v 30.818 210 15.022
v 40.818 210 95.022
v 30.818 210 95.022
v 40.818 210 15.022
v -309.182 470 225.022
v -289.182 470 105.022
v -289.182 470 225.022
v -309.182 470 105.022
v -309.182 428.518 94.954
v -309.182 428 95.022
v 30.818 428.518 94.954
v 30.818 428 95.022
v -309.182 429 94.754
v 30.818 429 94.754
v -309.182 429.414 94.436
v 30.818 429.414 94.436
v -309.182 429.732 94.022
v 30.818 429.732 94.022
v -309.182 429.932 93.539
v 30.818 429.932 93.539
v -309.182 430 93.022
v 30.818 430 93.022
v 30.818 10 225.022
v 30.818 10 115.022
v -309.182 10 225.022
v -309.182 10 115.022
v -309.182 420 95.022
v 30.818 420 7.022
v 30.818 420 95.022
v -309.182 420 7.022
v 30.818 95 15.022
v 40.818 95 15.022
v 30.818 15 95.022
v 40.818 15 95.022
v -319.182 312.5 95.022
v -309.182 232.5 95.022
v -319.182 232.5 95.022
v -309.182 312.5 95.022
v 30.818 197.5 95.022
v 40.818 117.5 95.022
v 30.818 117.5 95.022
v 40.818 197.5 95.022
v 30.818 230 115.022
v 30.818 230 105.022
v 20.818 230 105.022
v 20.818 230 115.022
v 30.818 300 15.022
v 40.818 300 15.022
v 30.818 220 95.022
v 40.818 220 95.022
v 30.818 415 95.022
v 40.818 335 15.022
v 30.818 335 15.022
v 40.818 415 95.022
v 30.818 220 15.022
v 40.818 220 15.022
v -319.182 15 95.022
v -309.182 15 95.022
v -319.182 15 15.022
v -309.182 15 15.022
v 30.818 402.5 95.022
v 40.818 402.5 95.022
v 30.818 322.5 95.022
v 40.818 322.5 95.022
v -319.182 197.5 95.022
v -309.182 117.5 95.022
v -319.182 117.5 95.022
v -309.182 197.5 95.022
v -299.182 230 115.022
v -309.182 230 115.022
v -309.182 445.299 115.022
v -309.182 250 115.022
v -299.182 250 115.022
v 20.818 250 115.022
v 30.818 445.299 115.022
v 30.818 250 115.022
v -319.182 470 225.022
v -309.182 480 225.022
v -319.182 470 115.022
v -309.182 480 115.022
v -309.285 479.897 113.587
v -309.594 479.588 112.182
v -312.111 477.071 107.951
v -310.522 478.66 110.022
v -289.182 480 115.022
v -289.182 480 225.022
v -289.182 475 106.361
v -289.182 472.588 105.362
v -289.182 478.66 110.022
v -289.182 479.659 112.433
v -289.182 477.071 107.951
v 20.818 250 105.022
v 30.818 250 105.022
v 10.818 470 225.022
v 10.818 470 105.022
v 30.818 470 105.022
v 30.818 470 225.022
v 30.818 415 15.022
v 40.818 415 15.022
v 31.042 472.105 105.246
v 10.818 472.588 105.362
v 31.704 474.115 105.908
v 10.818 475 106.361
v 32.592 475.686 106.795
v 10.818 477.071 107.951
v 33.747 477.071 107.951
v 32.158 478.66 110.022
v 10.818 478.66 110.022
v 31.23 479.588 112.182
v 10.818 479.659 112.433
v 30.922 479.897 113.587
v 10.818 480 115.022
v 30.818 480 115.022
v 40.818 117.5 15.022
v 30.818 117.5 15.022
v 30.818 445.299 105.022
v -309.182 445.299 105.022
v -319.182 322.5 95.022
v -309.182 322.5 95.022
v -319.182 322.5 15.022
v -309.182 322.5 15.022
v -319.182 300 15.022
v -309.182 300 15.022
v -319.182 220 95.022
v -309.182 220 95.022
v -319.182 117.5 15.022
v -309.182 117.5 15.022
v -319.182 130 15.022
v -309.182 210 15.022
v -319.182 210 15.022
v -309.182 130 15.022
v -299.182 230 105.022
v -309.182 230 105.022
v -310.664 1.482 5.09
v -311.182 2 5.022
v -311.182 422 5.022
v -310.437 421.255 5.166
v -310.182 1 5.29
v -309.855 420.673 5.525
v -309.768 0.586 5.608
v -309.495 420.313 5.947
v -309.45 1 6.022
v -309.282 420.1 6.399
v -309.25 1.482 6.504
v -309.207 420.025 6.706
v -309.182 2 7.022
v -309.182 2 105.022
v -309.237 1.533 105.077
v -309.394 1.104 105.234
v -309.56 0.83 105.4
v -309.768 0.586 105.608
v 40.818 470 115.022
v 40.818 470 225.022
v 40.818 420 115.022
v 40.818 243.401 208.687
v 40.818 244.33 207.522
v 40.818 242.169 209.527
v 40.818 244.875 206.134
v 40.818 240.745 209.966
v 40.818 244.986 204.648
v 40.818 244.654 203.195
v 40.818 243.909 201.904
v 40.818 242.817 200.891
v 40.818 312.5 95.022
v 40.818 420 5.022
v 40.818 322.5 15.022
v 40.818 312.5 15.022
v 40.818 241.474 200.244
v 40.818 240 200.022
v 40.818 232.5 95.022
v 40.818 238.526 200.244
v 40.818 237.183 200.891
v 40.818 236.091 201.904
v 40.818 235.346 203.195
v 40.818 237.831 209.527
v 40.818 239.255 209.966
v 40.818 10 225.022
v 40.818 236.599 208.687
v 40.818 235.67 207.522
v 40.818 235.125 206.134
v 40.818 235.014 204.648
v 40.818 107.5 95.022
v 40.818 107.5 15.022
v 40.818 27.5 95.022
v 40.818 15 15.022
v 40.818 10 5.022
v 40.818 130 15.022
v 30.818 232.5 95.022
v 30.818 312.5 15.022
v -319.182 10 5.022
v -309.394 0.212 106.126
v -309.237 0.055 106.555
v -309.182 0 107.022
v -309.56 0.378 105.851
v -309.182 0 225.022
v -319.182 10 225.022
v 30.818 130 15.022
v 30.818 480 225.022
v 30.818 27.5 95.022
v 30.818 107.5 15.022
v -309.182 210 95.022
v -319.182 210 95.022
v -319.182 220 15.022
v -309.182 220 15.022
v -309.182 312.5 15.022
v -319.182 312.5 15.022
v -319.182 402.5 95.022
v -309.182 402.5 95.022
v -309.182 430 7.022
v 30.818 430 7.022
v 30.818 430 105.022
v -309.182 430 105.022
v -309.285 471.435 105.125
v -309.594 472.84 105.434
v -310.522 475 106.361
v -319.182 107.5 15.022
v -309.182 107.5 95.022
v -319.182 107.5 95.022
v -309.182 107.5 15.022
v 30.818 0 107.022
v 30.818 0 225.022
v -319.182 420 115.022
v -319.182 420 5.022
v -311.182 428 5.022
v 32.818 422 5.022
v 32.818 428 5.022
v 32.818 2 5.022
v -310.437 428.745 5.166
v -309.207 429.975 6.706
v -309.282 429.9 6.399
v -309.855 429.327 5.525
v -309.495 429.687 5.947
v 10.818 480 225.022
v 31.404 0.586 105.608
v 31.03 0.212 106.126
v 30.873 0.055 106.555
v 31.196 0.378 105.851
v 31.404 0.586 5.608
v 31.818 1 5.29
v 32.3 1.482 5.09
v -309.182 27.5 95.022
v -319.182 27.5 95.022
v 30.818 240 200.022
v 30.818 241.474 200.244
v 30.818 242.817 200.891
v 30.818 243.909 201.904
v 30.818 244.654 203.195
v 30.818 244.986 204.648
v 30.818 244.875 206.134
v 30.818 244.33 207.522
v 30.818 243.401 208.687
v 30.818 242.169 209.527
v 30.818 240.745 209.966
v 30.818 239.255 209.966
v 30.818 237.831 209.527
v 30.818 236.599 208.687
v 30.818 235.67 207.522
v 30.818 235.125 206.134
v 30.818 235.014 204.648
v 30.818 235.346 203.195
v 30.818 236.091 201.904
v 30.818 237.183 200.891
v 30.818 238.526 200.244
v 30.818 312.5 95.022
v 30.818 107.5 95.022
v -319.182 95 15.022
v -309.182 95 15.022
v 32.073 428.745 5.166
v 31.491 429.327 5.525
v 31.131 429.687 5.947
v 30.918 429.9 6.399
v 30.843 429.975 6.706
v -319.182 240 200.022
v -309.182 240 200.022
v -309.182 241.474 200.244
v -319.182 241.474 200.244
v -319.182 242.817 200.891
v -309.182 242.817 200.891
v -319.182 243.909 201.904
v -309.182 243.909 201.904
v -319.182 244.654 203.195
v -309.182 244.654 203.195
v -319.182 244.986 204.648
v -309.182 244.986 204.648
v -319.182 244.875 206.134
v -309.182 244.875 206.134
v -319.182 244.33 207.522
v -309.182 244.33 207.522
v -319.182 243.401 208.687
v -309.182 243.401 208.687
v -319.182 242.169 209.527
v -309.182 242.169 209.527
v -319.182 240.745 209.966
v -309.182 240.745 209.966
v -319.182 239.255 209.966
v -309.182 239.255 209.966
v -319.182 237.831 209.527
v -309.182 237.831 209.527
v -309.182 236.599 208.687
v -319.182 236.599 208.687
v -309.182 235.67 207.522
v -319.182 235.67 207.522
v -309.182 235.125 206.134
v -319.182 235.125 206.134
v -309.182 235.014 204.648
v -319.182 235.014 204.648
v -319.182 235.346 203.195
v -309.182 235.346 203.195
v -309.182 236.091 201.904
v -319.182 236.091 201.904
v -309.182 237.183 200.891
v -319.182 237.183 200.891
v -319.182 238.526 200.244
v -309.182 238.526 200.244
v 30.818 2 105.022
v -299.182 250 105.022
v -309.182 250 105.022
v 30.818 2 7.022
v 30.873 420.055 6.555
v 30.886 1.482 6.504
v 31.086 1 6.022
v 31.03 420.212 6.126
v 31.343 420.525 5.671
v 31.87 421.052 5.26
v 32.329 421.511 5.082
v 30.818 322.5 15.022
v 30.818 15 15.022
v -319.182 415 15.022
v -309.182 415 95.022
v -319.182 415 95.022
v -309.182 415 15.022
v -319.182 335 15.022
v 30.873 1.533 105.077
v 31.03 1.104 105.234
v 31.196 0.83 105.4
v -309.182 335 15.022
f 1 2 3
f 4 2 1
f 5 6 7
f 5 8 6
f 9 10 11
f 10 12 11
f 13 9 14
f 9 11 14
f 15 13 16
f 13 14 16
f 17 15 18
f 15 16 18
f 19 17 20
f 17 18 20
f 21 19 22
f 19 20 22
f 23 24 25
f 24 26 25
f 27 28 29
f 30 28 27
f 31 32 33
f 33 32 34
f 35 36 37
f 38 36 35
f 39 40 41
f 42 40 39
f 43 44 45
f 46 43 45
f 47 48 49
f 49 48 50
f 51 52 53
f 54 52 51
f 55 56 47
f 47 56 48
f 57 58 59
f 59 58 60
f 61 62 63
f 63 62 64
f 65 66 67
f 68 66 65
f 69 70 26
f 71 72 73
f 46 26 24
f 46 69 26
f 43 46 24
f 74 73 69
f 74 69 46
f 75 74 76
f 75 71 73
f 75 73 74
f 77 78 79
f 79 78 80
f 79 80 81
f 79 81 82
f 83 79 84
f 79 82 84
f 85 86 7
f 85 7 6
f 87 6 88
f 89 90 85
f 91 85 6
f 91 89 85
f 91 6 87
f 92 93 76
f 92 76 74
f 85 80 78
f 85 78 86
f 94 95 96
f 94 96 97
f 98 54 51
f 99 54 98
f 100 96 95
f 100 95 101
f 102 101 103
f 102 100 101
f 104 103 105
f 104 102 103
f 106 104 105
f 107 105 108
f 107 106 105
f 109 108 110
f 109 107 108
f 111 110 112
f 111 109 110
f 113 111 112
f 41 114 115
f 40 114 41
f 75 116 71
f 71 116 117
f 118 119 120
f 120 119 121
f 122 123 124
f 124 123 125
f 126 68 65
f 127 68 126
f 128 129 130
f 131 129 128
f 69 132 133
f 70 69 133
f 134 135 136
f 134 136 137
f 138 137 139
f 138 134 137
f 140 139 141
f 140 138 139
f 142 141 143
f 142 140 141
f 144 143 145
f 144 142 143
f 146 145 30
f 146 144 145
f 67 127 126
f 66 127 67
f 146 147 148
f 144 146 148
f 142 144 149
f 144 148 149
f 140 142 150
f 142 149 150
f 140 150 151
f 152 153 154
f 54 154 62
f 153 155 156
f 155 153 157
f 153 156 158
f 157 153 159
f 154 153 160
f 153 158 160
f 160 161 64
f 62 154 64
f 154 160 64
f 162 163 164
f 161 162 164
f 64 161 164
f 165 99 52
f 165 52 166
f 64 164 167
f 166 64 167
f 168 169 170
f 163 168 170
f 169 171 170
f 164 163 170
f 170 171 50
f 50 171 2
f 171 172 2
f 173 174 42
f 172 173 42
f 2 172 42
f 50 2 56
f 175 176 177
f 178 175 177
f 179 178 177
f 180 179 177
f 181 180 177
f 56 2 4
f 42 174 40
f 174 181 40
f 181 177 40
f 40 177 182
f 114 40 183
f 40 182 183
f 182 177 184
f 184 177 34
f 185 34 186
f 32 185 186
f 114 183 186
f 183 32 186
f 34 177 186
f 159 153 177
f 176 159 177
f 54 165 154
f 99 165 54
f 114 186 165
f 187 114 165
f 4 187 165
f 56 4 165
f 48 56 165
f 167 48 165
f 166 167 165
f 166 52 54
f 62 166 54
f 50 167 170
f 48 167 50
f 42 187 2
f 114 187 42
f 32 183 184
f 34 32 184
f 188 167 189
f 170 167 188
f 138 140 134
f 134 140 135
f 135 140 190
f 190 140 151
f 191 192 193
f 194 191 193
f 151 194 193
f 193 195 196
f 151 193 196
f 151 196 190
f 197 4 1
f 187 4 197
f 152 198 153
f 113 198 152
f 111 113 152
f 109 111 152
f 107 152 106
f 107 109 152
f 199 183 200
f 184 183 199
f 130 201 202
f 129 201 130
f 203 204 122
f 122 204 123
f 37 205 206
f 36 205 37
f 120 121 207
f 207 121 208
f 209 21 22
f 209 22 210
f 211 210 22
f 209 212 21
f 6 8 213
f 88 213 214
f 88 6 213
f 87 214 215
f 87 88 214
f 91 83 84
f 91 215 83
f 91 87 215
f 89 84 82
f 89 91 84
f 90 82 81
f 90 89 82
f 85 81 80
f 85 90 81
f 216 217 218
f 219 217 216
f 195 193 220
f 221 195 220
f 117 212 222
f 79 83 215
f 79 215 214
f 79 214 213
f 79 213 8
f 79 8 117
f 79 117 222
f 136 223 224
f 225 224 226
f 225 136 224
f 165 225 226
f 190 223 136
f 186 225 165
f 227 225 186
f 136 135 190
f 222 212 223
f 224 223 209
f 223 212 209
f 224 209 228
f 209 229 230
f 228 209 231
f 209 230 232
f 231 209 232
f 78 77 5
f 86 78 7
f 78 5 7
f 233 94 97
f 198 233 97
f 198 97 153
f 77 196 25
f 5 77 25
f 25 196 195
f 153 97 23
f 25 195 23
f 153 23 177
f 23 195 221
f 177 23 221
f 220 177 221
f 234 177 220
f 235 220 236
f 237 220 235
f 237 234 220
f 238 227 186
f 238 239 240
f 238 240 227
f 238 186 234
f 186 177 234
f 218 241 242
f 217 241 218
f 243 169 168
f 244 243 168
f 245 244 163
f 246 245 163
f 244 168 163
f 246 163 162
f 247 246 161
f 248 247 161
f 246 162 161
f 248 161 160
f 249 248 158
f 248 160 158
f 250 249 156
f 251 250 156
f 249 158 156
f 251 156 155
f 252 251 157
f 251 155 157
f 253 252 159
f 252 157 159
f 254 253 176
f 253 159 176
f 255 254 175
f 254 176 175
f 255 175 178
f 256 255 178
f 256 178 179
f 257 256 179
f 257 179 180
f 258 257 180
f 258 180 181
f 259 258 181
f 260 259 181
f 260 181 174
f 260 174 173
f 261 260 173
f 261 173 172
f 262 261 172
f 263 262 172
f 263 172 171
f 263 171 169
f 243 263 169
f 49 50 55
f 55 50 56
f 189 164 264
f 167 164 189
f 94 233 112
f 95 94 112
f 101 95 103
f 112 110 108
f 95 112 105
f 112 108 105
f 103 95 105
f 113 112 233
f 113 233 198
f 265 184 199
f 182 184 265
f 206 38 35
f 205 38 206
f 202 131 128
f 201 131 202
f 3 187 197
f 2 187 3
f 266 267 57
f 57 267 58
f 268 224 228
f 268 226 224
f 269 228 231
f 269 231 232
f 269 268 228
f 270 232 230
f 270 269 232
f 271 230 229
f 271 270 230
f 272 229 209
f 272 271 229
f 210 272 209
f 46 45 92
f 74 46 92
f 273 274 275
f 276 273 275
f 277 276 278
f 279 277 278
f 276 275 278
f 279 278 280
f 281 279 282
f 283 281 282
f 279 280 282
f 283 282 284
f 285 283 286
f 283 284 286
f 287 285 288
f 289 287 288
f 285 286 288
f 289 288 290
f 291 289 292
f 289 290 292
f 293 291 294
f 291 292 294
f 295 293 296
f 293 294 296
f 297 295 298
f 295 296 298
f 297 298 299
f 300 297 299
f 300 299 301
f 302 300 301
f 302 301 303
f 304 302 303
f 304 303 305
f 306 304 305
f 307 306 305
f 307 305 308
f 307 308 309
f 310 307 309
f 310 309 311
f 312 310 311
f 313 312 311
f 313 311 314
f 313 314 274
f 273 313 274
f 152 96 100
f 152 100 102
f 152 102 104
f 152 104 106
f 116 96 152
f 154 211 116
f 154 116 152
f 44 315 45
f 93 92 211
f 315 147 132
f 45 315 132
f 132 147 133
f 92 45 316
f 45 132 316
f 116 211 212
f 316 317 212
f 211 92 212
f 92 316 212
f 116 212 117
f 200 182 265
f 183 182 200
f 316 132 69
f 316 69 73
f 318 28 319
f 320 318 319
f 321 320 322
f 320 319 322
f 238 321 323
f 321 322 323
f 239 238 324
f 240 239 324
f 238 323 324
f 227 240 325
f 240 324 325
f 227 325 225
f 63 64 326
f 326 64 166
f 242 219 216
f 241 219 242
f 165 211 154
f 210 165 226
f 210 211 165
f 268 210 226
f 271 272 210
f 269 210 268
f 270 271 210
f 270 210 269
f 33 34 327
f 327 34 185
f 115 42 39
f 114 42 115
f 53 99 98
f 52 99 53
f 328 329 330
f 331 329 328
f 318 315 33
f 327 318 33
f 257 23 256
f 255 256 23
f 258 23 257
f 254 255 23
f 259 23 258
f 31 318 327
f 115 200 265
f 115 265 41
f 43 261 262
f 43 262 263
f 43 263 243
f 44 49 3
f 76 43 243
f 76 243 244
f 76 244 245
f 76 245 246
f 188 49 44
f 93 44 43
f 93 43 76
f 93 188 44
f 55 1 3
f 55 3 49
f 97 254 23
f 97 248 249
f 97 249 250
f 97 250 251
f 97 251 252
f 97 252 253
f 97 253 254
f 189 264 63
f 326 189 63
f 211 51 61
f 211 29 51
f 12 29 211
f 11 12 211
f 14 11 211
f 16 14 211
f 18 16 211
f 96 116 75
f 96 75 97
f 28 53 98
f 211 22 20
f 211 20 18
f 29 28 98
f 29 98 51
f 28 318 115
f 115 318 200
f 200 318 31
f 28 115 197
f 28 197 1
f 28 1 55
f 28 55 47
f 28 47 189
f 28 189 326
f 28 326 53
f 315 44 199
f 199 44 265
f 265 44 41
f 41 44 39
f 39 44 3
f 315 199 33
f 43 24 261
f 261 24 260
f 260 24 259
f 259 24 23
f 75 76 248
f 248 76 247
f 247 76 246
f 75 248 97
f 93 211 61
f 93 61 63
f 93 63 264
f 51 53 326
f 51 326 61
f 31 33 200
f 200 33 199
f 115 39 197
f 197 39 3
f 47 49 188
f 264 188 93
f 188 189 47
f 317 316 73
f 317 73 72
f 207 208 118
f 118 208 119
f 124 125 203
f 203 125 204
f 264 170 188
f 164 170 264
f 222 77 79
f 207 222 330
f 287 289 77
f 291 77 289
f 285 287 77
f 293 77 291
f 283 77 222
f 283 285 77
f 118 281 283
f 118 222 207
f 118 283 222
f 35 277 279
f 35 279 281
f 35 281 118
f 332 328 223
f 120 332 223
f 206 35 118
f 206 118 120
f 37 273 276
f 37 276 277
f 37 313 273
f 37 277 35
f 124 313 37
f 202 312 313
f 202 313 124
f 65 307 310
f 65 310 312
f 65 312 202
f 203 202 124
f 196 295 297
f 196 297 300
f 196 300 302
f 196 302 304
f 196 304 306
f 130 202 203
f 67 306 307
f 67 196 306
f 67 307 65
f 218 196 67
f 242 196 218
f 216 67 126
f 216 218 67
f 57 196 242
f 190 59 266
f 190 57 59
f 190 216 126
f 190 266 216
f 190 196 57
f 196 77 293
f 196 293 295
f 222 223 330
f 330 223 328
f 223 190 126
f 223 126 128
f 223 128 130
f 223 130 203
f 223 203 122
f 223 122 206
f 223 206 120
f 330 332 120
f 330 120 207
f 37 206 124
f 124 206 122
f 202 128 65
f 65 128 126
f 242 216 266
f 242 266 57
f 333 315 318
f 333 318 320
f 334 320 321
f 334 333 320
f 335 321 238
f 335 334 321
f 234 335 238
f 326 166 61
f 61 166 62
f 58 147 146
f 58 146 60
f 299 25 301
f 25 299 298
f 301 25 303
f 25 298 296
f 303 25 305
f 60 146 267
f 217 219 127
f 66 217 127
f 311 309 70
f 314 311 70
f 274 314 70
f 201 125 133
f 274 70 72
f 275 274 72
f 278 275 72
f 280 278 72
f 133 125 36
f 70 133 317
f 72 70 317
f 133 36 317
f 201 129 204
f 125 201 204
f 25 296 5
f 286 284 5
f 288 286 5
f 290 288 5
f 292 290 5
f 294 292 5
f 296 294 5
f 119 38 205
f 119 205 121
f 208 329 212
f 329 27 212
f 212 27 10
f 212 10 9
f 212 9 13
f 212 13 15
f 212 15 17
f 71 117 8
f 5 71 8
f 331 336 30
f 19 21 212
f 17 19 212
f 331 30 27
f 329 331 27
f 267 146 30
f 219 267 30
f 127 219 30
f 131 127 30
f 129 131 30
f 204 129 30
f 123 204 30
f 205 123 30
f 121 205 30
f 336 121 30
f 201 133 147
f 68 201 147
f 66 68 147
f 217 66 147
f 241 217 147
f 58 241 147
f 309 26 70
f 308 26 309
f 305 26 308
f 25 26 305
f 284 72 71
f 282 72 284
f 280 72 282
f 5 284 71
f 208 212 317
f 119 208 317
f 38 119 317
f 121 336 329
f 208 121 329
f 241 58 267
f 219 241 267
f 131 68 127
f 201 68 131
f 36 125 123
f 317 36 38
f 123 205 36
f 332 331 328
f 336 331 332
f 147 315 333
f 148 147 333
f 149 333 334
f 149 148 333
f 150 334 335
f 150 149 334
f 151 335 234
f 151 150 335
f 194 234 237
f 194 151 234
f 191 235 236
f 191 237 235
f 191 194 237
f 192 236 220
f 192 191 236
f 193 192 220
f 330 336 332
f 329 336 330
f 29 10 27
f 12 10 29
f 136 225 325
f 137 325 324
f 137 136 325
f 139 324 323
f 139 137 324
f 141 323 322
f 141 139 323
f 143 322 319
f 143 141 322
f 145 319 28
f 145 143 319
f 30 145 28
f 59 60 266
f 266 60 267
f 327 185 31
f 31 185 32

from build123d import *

# Parameters (mm, degrees)
SKETCH2_W                = 360
SKETCH2_H                = 220
BOSS_EXTRUDE1_DEPTH      = 480
SKETCH4_W                = 280
SKETCH4_H                = 110
CUT_EXTRUDE2_DEPTH       = 470
SKETCH5_W                = 110
SKETCH5_H                = 460
CUT_EXTRUDE3_DEPTH       = 40
SKETCH6_W                = 340
SKETCH6_H                = 100
CUT_EXTRUDE4_DEPTH       = 50
SKETCH7_W                = 340
SKETCH7_H                = 10
CUT_EXTRUDE5_DEPTH       = 420
SKETCH8_W                = 340
SKETCH8_H                = 410
CUT_EXTRUDE6_DEPTH       = 90
SKETCH12_W               = 10
SKETCH12_H               = 20
CUT_EXTRUDE9_DEPTH       = 10
CUT_EXTRUDE11_DEPTH      = 470
CUT_EXTRUDE11_DEPTH_BACK = 10
SKETCH18_W               = 100
SKETCH18_H               = 50
SKETCH23_W               = 110
SKETCH23_H               = 460
CUT_EXTRUDE13_DEPTH      = 20
SKETCH24_W               = 20
SKETCH24_H               = 110
CUT_EXTRUDE14_DEPTH      = 10
SKETCH26_R               = 5
CUT_EXTRUDE15_DEPTH      = 480
CUT_EXTRUDE16_DEPTH      = 480
SKETCH28_W               = 340
SKETCH28_H               = 10
CUT_EXTRUDE17_DEPTH      = 100
CHAMFER1_SIZE            = 10
CHAMFER2_SIZE            = 10
FILLET2_R                = 10
CHAMFER3_SIZE            = 10
FILLET4_R                = 2
FILLET5_R                = 2
CHAMFER4_SIZE            = 10
SKETCH29_W               = 340
SKETCH29_H               = 24.70137943
CUT_EXTRUDE18_DEPTH      = 10
SKETCH30_W               = 300
SKETCH30_H               = 27.571183361
CUT_EXTRUDE19_DEPTH      = 10


# Some blends are built 0.0001 mm under size
with BuildPart() as part:
    # Sketch2 → Boss-Extrude1 (new body)
    with BuildSketch(Plane(origin=(0, 0, 0), x_dir=(1, 0, 0), z_dir=(0, 1, 0))):
        with Locations((-139.181984943, -115.021725484)):
            Rectangle(SKETCH2_W, SKETCH2_H)
    extrude(amount=BOSS_EXTRUDE1_DEPTH)

    # Sketch4 → Cut-Extrude2 (cut)
    with BuildSketch(Plane(origin=(0, 480, 0), x_dir=(1, 0, 0), z_dir=(0, 1, 0))):
        with Locations((-129.181984943, -170.021725484)):
            Rectangle(SKETCH4_W, SKETCH4_H)
    extrude(amount=-CUT_EXTRUDE2_DEPTH, mode=Mode.SUBTRACT)

    # Sketch5 → Cut-Extrude3 (cut)
    with BuildSketch(Plane(origin=(-269.181984943, 0, 0), x_dir=(0, 0, -1), z_dir=(1, 0, 0))):
        with Locations((-170.021725484, 240)):
            Rectangle(SKETCH5_W, SKETCH5_H)
    extrude(amount=-CUT_EXTRUDE3_DEPTH, mode=Mode.SUBTRACT)

    # Sketch6 → Cut-Extrude4 (cut)
    with BuildSketch(Plane(origin=(0, 480, 0), x_dir=(1, 0, 0), z_dir=(0, 1, 0))):
        with Locations((-139.181984943, -55.021725484)):
            Rectangle(SKETCH6_W, SKETCH6_H)
    extrude(amount=-CUT_EXTRUDE4_DEPTH, mode=Mode.SUBTRACT)

    # Sketch7 → Cut-Extrude5 (cut)
    with BuildSketch(Plane(origin=(0, 430, 0), x_dir=(1, 0, 0), z_dir=(0, 1, 0))):
        with Locations((-139.181984943, -100.021725484)):
            Rectangle(SKETCH7_W, SKETCH7_H)
    extrude(amount=-CUT_EXTRUDE5_DEPTH, mode=Mode.SUBTRACT)

    # Sketch8 → Cut-Extrude6 (cut)
    with BuildSketch(Plane(origin=(0, 0, 5.021725484), x_dir=(-1, 0, 0), z_dir=(0, 0, -1))):
        with Locations((139.181984943, 215)):
            Rectangle(SKETCH8_W, SKETCH8_H)
    extrude(amount=-CUT_EXTRUDE6_DEPTH, mode=Mode.SUBTRACT)

    # Sketch12 → Cut-Extrude9 (cut)
    with BuildSketch(Plane(origin=(0, 0, 105.021725484), x_dir=(-1, 0, 0), z_dir=(0, 0, -1))):
        with Locations((-25.818015057, 240)):
            Rectangle(SKETCH12_W, SKETCH12_H)
        with Locations((304.181984943, 240)):
            Rectangle(SKETCH12_W, SKETCH12_H)
    extrude(amount=-CUT_EXTRUDE9_DEPTH, mode=Mode.SUBTRACT)

    # Sketch18 → Cut-Extrude11 (cut, two sides: drawn at the far end of the back side and taken through both)
    with BuildSketch(Plane(origin=(-309.181984943, 0, 0), x_dir=(0, 0, -1), z_dir=(1, 0, 0)).offset(-CUT_EXTRUDE11_DEPTH_BACK)):
        with Locations((-55.021725484, 455)):
            Rectangle(SKETCH18_W, SKETCH18_H)
    extrude(amount=CUT_EXTRUDE11_DEPTH + CUT_EXTRUDE11_DEPTH_BACK, mode=Mode.SUBTRACT)

    # Sketch23 → Cut-Extrude13 (cut)
    with BuildSketch(Plane.ZY.offset(-10.818015057)):
        with Locations((170.021725484, 240)):
            Rectangle(SKETCH23_W, SKETCH23_H)
    extrude(amount=-CUT_EXTRUDE13_DEPTH, mode=Mode.SUBTRACT)

    # Sketch24 → Cut-Extrude14 (cut)
    with BuildSketch(Plane(origin=(0, 480, 0), x_dir=(1, 0, 0), z_dir=(0, 1, 0))):
        with Locations((-279.181984943, -170.021725484)):
            Rectangle(SKETCH24_W, SKETCH24_H)
    extrude(amount=-CUT_EXTRUDE14_DEPTH, mode=Mode.SUBTRACT)

    # Sketch26 → Cut-Extrude15 (cut)
    with BuildSketch(Plane(origin=(40.818015057, 0, 0), x_dir=(0, 0, -1), z_dir=(1, 0, 0))):
        with Locations((-205.021725484, 240)):
            Circle(SKETCH26_R)
    extrude(amount=-CUT_EXTRUDE15_DEPTH, mode=Mode.SUBTRACT)

    # Sketch27 → Cut-Extrude16 (cut)
    with BuildSketch(Plane(origin=(40.818015057, 0, 0), x_dir=(0, 0, -1), z_dir=(1, 0, 0))):
        Polygon((-15.021725484, 335), (-95.021725484, 415), (-15.021725484, 415), align=None)
        Polygon((-15.021725484, 322.5), (-95.021725484, 402.5), (-95.021725484, 322.5), align=None)
        Polygon((-15.021725484, 312.5), (-95.021725484, 232.5), (-95.021725484, 312.5), align=None)
        Polygon((-15.021725484, 220), (-15.021725484, 300), (-95.021725484, 220), align=None)
        Polygon((-15.021725484, 130), (-95.021725484, 210), (-15.021725484, 210), align=None)
        Polygon((-95.021725484, 117.5), (-95.021725484, 197.5), (-15.021725484, 117.5), align=None)
        Polygon((-15.021725484, 107.5), (-95.021725484, 27.5), (-95.021725484, 107.5), align=None)
        Polygon((-15.021725484, 15), (-15.021725484, 95), (-95.021725484, 15), align=None)
    extrude(amount=-CUT_EXTRUDE16_DEPTH, mode=Mode.SUBTRACT)

    # Sketch28 → Cut-Extrude17 (cut)
    with BuildSketch(Plane(origin=(0, 0, 5.021725484), x_dir=(-1, 0, 0), z_dir=(0, 0, -1))):
        with Locations((139.181984943, 5)):
            Rectangle(SKETCH28_W, SKETCH28_H)
    extrude(amount=-CUT_EXTRUDE17_DEPTH, mode=Mode.SUBTRACT)

    # Chamfer1
    chamfer1_edges = [part.edges().sort_by_distance(p)[0] for p in [
        (40.818015057, 430, 55.021725484),
        (-319.181984943, 430, 55.021725484),
    ]]
    chamfer(chamfer1_edges, length=CHAMFER1_SIZE - 0.0001)  # a hair under: the kernel refuses the full size

    # Chamfer2
    chamfer2_edges = [part.edges().sort_by_distance(p)[0] for p in [
        (-319.181984943, 480, 165.021725484),
        (40.818015057, 480, 165.021725484),
    ]]
    chamfer(chamfer2_edges, length=CHAMFER2_SIZE)

    # Fillet2
    fillet2_edges = [part.edges().sort_by_distance(p)[0] for p in [
        (-139.181984943, 480, 105.021725484),
    ]]
    fillet(fillet2_edges, radius=FILLET2_R - 0.0001)  # a hair under: the kernel refuses the full size

    # Chamfer3
    # the kernel refuses this chamfer: 10 mm, written as the material it takes off along each edge
    with BuildSketch(Plane(origin=(-319.181984943, 495.71682988, 105.021725484), x_dir=(0.9996219169112968, 0, -0.027495876610586282), z_dir=(0, -1, 0))) as chamfer3_piece_1_section:
        Polygon((CHAMFER3_SIZE * 0.999621916911, CHAMFER3_SIZE * 0.0274958766106), (-CHAMFER3_SIZE * 0.0274958766106, CHAMFER3_SIZE * 0.999621916911), (0, 0), align=None)
    chamfer3_piece_1 = extrude(amount=101.433559759, mode=Mode.PRIVATE)
    chamfer3_piece_1 = split(chamfer3_piece_1, bisect_by=Plane(origin=(-315.895641605, 430, 108.325767027), z_dir=(0, 1, 0)), keep=Keep.TOP, mode=Mode.PRIVATE)
    chamfer3_piece_1 = split(chamfer3_piece_1, bisect_by=Plane(origin=(-309.181984943, 462.85841494, 108.325767027), z_dir=(-1, 0, 0)), keep=Keep.TOP, mode=Mode.PRIVATE)
    add(chamfer3_piece_1, mode=Mode.SUBTRACT)
    with BuildSketch(Plane(origin=(-319.181984943, 495.71682988, 105.021725484), x_dir=(0.9996219169112968, 0, -0.027495876610586282), z_dir=(0, -1, 0))) as chamfer3_piece_2_section:
        Polygon((CHAMFER3_SIZE * 0.999621916911, CHAMFER3_SIZE * 0.0274958766106), (-CHAMFER3_SIZE * 0.0274958766106, CHAMFER3_SIZE * 0.999621916911), (0, 0), align=None)
    chamfer3_piece_2 = extrude(amount=101.433559759, mode=Mode.PRIVATE)
    chamfer3_piece_2 = split(chamfer3_piece_2, bisect_by=Plane(origin=(-314.919016281, 424.263068662, 108.826082354), z_dir=(-0.7071067811865476, 0.7071067811865476, 0)), keep=Keep.TOP, mode=Mode.PRIVATE)
    chamfer3_piece_2 = split(chamfer3_piece_2, bisect_by=Plane(origin=(-316.831326727, 430, 108.826082354), z_dir=(0, -1, 0)), keep=Keep.TOP, mode=Mode.PRIVATE)
    add(chamfer3_piece_2, mode=Mode.SUBTRACT)
    with BuildSketch(Plane(origin=(40.818015057, 394.28327012, 105.021725484), x_dir=(-0.9996219169112968, 0, -0.027495876610586317), z_dir=(0, 1, 0))) as chamfer3_piece_3_section:
        Polygon((CHAMFER3_SIZE * 0.999621916911, CHAMFER3_SIZE * 0.0274958766106), (-CHAMFER3_SIZE * 0.0274958766106, CHAMFER3_SIZE * 0.999621916911), (0, 0), align=None)
    chamfer3_piece_3 = extrude(amount=101.433559759, mode=Mode.PRIVATE)
    chamfer3_piece_3 = split(chamfer3_piece_3, bisect_by=Plane(origin=(36.555046395, 424.263068662, 108.826082354), z_dir=(0.7071067811865485, 0.7071067811865467, 0)), keep=Keep.TOP, mode=Mode.PRIVATE)
    chamfer3_piece_3 = split(chamfer3_piece_3, bisect_by=Plane(origin=(38.46735684, 430, 108.826082354), z_dir=(0, -1, 0)), keep=Keep.TOP, mode=Mode.PRIVATE)
    add(chamfer3_piece_3, mode=Mode.SUBTRACT)
    with BuildSketch(Plane(origin=(40.818015057, 394.28327012, 105.021725484), x_dir=(-0.9996219169112968, 0, -0.027495876610586317), z_dir=(0, 1, 0))) as chamfer3_piece_4_section:
        Polygon((CHAMFER3_SIZE * 0.999621916911, CHAMFER3_SIZE * 0.0274958766106), (-CHAMFER3_SIZE * 0.0274958766106, CHAMFER3_SIZE * 0.999621916911), (0, 0), align=None)
    chamfer3_piece_4 = extrude(amount=101.433559759, mode=Mode.PRIVATE)
    chamfer3_piece_4 = split(chamfer3_piece_4, bisect_by=Plane(origin=(37.531671719, 430, 108.325767027), z_dir=(0, 1, 0)), keep=Keep.TOP, mode=Mode.PRIVATE)
    chamfer3_piece_4 = split(chamfer3_piece_4, bisect_by=Plane(origin=(30.818015057, 462.85841494, 108.325767027), z_dir=(1, 0, 0)), keep=Keep.TOP, mode=Mode.PRIVATE)
    add(chamfer3_piece_4, mode=Mode.SUBTRACT)

    # Fillet4
    fillet4_edges = [part.edges().sort_by_distance(p)[0] for p in [
        (-139.181984943, 0, 105.021725484),
        (-309.181984943, 0, 55.021725484),
        (30.818015057, 0, 55.021725484),
        (-139.181984943, 430, 5.021725484),
        (30.818015057, 210, 5.021725484),
        (-139.181984943, 420, 5.021725484),
        (-309.181984943, 210, 5.021725484),
    ]]
    fillet(fillet4_edges, radius=FILLET4_R)

    # Fillet5
    fillet5_edges = [part.edges().sort_by_distance(p)[0] for p in [
        (-139.181984943, 430, 95.021725484),
    ]]
    fillet(fillet5_edges, radius=FILLET5_R)

    # Chamfer4
    # the kernel refuses this chamfer: 10 mm, written as the material it takes off along each edge
    with BuildSketch(Plane(origin=(-319.181984943, 0, 250.738555364), x_dir=(0.9996219169112968, -0.027495876610586334, 0), z_dir=(0, 0, -1))) as chamfer4_piece_1:
        Polygon((CHAMFER4_SIZE * 0.999621916911, -CHAMFER4_SIZE * 0.0274958766106), (-CHAMFER4_SIZE * 0.0274958766106, -CHAMFER4_SIZE * 0.999621916911), (0, 0), align=None)
    extrude(amount=271.433659759, mode=Mode.SUBTRACT)
    with BuildSketch(Plane(origin=(40.818015057, 0, -20.695104396), x_dir=(0.027495876610586317, 0.9996219169112968, 0), z_dir=(0, 0, 1))) as chamfer4_piece_2:
        Polygon((CHAMFER4_SIZE * 0.999621916911, CHAMFER4_SIZE * 0.0274958766106), (-CHAMFER4_SIZE * 0.0274958766106, CHAMFER4_SIZE * 0.999621916911), (0, 0), align=None)
    extrude(amount=271.433659759, mode=Mode.SUBTRACT)

    # Sketch29 → Cut-Extrude18 (cut)
    with BuildSketch(Plane(origin=(0, 0, 105.021725484), x_dir=(-1, 0, 0), z_dir=(0, 0, -1))):
        with Locations((139.181984943, 457.649310285)):
            Rectangle(SKETCH29_W, SKETCH29_H)
    extrude(amount=-CUT_EXTRUDE18_DEPTH, mode=Mode.SUBTRACT)

    # Sketch30 → Cut-Extrude19 (cut)
    with BuildSketch(Plane(origin=(0, 480, 0), x_dir=(1, 0, 0), z_dir=(0, 1, 0))):
        with Locations((-139.181984943, -101.236133803)):
            Rectangle(SKETCH30_W, SKETCH30_H)
    extrude(amount=-CUT_EXTRUDE19_DEPTH, mode=Mode.SUBTRACT)


solid = part.part
